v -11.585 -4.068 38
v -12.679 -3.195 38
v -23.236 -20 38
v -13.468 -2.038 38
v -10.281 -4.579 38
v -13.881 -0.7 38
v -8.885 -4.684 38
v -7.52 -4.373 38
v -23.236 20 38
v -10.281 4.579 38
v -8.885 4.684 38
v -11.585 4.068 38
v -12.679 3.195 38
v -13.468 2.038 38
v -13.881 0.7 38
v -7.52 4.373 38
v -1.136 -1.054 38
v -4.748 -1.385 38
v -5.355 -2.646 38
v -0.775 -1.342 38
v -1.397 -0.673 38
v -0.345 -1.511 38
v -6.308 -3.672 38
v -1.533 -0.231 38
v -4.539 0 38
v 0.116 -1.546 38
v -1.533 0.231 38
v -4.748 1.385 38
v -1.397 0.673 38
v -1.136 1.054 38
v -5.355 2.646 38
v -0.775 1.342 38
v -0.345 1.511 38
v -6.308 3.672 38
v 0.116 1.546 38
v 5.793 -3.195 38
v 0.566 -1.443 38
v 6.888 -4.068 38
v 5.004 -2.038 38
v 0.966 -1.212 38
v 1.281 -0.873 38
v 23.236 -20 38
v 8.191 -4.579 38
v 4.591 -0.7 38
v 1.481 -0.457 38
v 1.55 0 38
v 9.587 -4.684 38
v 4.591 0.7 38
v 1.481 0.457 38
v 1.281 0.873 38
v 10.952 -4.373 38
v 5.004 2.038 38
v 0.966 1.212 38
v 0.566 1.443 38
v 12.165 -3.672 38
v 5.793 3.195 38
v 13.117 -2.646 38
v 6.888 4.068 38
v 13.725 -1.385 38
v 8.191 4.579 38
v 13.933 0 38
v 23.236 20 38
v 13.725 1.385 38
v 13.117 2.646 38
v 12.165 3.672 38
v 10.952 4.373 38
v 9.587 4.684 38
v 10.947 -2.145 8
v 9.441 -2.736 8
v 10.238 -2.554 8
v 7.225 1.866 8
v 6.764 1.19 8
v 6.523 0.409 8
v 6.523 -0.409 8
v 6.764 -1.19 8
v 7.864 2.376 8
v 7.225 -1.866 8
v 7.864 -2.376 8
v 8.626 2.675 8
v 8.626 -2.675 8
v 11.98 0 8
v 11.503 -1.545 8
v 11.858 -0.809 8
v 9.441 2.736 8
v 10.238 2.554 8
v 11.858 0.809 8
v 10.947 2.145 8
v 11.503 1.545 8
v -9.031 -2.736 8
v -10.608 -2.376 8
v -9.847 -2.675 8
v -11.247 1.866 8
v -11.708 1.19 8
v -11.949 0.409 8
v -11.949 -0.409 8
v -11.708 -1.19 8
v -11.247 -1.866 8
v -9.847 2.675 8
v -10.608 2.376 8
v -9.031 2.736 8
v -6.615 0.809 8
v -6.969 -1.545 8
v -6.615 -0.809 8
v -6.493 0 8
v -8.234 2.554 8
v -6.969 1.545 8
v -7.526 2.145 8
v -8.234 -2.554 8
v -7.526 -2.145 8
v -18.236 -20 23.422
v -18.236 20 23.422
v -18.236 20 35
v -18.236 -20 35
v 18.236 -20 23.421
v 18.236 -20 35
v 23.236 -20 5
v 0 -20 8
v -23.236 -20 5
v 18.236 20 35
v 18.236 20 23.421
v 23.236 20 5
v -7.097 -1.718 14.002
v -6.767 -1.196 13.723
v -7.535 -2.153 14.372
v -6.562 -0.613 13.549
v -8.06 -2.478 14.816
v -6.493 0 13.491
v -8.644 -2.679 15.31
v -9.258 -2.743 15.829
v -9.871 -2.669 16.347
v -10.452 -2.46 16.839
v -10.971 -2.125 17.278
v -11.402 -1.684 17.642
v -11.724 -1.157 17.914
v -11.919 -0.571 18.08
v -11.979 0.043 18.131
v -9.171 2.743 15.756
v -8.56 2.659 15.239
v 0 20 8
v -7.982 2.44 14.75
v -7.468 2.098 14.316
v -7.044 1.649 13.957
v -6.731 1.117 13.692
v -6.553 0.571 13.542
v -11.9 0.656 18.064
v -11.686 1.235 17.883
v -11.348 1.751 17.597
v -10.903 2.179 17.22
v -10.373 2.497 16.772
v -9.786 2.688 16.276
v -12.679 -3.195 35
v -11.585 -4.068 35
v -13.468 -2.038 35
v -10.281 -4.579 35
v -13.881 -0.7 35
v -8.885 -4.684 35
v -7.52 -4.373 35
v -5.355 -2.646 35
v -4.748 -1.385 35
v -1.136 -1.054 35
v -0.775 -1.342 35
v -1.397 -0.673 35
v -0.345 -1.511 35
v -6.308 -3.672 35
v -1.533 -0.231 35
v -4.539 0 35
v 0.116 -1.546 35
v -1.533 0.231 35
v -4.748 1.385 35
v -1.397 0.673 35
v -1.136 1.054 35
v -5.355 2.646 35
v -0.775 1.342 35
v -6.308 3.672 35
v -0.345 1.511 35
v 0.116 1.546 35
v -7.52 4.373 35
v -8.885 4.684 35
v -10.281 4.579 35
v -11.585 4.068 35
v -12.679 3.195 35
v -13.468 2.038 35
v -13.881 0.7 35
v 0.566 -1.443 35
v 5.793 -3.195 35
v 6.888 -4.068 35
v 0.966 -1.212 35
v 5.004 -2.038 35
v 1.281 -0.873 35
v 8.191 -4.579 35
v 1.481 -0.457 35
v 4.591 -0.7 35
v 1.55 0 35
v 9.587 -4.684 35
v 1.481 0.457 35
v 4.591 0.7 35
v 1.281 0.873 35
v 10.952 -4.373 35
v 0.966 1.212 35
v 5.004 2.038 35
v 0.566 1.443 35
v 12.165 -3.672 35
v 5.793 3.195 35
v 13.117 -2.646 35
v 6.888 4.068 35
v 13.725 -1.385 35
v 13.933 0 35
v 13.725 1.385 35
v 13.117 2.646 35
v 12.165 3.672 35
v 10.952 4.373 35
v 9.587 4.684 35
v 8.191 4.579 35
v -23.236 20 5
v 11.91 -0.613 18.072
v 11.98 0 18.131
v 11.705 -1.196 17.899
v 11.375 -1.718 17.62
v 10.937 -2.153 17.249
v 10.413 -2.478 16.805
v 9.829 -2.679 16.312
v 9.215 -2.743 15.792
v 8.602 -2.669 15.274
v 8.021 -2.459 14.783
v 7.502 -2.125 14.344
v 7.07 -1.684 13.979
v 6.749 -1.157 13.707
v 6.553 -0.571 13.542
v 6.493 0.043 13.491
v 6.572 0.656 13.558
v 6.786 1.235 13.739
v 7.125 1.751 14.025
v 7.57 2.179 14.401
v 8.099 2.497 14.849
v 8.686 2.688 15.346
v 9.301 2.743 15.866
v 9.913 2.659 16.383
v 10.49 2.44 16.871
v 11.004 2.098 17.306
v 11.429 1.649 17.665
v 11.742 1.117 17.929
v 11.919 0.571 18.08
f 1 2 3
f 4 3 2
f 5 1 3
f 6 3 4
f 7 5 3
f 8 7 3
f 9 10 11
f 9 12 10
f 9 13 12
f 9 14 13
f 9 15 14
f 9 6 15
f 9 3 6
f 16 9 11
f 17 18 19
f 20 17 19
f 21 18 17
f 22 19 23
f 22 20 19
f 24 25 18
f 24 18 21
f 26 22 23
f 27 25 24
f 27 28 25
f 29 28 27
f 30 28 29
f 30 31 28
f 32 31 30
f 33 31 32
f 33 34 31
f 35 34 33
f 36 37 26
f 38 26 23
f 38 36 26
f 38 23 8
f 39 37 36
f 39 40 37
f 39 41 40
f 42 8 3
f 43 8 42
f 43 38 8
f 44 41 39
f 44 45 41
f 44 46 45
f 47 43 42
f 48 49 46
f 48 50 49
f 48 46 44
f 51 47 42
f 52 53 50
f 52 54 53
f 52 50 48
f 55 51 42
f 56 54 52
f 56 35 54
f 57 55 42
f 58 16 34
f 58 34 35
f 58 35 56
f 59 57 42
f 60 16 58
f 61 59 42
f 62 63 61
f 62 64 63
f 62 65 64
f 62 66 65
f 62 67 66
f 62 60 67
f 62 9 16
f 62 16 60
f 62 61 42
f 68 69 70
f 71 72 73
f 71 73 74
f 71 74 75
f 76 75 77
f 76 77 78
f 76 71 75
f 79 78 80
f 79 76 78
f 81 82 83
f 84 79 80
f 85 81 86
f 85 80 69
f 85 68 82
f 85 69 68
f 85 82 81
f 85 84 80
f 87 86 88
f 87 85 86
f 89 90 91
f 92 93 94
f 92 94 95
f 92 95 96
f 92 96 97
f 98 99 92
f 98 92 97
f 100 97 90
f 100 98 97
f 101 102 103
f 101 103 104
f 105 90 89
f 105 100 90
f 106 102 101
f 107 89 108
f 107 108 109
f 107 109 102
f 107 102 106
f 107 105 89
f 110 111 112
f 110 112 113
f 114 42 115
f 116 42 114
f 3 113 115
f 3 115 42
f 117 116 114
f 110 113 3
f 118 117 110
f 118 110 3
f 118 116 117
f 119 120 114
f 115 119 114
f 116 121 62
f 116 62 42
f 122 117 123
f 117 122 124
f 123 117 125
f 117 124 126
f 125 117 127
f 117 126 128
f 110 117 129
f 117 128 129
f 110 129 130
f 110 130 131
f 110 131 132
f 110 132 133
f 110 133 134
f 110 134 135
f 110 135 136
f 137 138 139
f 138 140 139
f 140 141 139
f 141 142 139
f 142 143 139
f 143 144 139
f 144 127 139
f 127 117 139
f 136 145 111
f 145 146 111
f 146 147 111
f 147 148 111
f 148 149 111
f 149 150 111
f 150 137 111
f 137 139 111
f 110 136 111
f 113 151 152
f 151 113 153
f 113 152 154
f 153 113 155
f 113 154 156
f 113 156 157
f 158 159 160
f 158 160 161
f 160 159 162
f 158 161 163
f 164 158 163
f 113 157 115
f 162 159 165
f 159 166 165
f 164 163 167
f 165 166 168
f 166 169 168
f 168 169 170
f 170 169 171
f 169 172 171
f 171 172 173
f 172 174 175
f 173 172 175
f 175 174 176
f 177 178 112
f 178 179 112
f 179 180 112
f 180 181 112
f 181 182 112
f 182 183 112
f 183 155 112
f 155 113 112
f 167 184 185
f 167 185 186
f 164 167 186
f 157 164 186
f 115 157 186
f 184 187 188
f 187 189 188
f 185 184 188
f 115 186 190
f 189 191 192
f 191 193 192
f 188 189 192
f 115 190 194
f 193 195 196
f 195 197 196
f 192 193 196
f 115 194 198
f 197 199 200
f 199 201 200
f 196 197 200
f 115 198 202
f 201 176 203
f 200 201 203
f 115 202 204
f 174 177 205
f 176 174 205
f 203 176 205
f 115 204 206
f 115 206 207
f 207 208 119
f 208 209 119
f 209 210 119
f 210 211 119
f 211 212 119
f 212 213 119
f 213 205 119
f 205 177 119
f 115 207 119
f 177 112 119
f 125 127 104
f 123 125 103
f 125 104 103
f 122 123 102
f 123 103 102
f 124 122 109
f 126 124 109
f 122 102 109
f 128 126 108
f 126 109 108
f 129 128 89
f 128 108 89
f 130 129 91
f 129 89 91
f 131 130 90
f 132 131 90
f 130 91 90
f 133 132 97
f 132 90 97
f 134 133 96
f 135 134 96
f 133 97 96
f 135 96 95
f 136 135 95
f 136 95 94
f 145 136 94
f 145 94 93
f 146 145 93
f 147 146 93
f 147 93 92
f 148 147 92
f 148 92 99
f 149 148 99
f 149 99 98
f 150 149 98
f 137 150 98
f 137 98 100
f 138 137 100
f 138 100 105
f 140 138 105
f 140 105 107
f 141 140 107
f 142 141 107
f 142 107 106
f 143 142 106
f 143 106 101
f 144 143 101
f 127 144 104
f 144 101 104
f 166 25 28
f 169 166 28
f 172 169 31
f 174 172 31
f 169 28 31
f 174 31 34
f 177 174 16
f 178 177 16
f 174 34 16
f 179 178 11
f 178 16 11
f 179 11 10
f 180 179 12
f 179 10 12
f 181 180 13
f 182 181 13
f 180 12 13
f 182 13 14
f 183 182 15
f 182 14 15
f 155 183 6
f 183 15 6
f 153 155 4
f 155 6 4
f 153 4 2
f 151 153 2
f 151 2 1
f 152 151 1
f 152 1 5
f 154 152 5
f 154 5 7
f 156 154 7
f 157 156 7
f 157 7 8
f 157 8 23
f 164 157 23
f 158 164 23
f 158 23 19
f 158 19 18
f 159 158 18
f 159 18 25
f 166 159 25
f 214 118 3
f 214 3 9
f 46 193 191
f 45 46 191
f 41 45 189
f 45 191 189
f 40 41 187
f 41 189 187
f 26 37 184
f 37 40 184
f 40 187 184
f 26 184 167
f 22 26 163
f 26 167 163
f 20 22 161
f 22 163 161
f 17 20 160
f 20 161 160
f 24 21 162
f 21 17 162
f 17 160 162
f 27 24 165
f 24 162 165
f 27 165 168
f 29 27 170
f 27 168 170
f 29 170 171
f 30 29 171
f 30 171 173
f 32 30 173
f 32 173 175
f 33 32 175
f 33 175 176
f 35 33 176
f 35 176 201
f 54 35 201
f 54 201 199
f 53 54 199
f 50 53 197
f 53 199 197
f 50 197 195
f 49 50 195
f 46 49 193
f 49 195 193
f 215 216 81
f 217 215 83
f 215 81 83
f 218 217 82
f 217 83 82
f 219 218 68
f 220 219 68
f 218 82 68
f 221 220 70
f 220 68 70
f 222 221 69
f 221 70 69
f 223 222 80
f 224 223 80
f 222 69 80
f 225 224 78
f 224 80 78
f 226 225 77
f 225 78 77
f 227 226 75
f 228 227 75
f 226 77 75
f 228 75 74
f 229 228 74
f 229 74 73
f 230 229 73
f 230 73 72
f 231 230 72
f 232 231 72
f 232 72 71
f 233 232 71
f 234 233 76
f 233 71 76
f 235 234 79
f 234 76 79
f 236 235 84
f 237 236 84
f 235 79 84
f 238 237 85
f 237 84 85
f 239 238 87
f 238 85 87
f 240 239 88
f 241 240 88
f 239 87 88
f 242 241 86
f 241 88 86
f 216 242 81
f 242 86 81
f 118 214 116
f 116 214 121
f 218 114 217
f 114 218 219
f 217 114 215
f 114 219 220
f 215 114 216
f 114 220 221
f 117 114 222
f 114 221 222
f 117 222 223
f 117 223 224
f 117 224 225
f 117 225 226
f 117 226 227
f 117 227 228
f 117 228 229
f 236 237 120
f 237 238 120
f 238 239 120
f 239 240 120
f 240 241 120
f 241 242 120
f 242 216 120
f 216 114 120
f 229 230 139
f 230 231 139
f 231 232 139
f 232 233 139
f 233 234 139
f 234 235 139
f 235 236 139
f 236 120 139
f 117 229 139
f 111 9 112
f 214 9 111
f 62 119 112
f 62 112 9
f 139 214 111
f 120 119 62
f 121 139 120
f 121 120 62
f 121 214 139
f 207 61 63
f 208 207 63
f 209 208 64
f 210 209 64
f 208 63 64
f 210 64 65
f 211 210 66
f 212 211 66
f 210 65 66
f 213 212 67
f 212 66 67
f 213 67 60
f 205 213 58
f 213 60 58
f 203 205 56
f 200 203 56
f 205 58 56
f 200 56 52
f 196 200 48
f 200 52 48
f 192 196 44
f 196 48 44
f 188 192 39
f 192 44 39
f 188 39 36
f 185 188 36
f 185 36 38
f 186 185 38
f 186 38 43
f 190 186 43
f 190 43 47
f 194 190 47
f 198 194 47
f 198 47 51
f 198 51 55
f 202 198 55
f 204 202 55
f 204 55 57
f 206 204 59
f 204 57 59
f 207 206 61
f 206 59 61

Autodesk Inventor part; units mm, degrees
ref_plane "YZ Plane" through (0, 0, 0) normal (1, 0, 0) x (0, 1, 0)
ref_plane "XZ Plane" through (0, 0, 0) normal (0, 1, 0) x (-1, 0, 0)
ref_plane "XY Plane" through (0, 0, 0) normal (0, 0, 1) x (1, 0, 0)
ref_plane "РабПлоскость2" through (0, 0, 5) normal (0, 0, 1) x (1, 0, 0)
sketch "Эскиз1" plane through (0, 0, 5) normal (0, 0, 1) x (1, 0, 0)
  line L0 (-14.2362, -16) -> (14.1136, -16) projected
  arc A0 (14.1136, -15.5263) -> (14.1136, -16) centre (14.9819, -15.7632) ccw projected
  line L1 (-14.2362, 16) -> (-14.2362, -16) projected
  line L2 (-18.2362, 20) -> (18.2362, 20)
  line L3 (18.2362, 20) -> (18.2362, -20)
  line L4 (18.2362, -20) -> (-18.2362, -20)
  line L5 (-18.2362, -20) -> (-18.2362, 20)
  circle A1 centre (9.2362, 0) radius 1.6
  circle A2 centre (-9.2362, 0) radius 1.6
  circle A3 centre (0.7638, 0) radius 2.15 projected
  circle A4 centre (19.2362, 0) radius 2.15 projected
  line L6 (14.1136, -15.5263) -> (14.1136, -16) projected
  line L7 (14.1136, -16) -> (23.5645, -16) projected
  line L8 (23.5645, -16) -> (23.5645, 16) projected
  line L9 (23.5645, 16) -> (-14.2362, 16) projected
  circle A5 centre (9.2362, -11) radius 3.25 projected
  circle A6 centre (9.2362, 11) radius 3.25 projected
  circle A7 centre (-9.2362, -11) radius 3.25 projected
  circle A8 centre (-9.2362, 11) radius 3.25 projected
  point P0 (14.2362, 16)
  dimension "d0" = 4
  dimension "d2" = 4
extrude "Выдавливание1" add sketch "Эскиз1" along normal blind 3 contours A0 L6 | L1 L9 L3 A4 L7 L0 | L0 L7 L3 L4 L5 L2 L9 L1 | A4 L3 | A1 | A2 | A3 | A5 | A6 | A7 | A8 picked at (17.8581, 0.0863)
sketch "Эскиз3" plane through (-18.2362, 20, 5) normal (0, 1, 0) x (1, 0, 0)
  line L0 (0, -3) -> (36.4725, -3) projected
  line L1 (36.4725, -3) -> (36.4725, -18.4215)
  line L2 (36.4725, -18.4215) -> (18.2361, -3)
  line L3 (18.2361, -3) -> (0, -18.4219)
  line L4 (0, -18.4219) -> (0, -3)
  point P0 (18.2362, 5)
  point P1 (18.2361, -3)
  point P2 (18.2361, -3)
extrude "Выдавливание2" add sketch "Эскиз3" against normal up to surface (40 mm away)
ref_plane "РабПлоскость4" through (0, 0, 8) normal (0, 0, 1) x (1, 0, 0)
sketch "Эскиз4" plane through (0, 0, 8) normal (0, 0, 1) x (1, 0, 0)
  circle A0 centre (9.2362, 0) radius 1.6 projected
  circle A1 centre (-9.2362, 0) radius 1.6 projected
  circle A2 centre (9.2362, 0) radius 2.7434
  circle A3 centre (-9.2362, 0) radius 2.7434
  point P0 (0, 0)
extrude "Выдавливание3" cut sketch "Эскиз4" along normal blind 14.75 contours A0 | A1 | A2 | A3
sketch "Эскиз5" plane through (0, 0, 5) normal (0, 0, -1) x (-1, 0, 0)
  line L0 (18.2362, 20) -> (18.2362, -20) projected
  line L1 (18.2362, 20) -> (23.2362, 20)
  line L2 (23.2362, 20) -> (23.2362, -20)
  line L3 (23.2362, -20) -> (18.2362, -20)
  line L4 (18.2362, -20) -> (18.2362, 20)
  line L5 (0.0002, -20) -> (-18.2362, -20) projected
  line L6 (-18.2362, -20) -> (-23.2362, -20)
  line L7 (-23.2362, -20) -> (-23.2362, 20)
  line L8 (-23.2362, 20) -> (-18.2362, 20)
  line L9 (-18.2362, 20) -> (-18.2362, -20)
  point P0 (0, 0)
  dimension "d11" = 5
  dimension "d12" = 5
extrude "Выдавливание4" add sketch "Эскиз5" against normal blind 30
sketch "Эскиз6" plane through (0, 0, 35) normal (0, 0, 1) x (1, 0, 0)
  line L0 (-23.2362, 20) -> (23.2362, 20)
  line L1 (23.2362, 20) -> (23.2362, -20)
  line L2 (23.2362, -20) -> (-23.2362, -20)
  line L3 (-23.2362, -20) -> (-23.2362, 20)
  circle A0 centre (0, 0) radius 1.55
  line L4 (23.2362, -20) -> (23.2362, 20) projected
  line L5 (23.2362, 20) -> (18.2362, 20) projected
  line L6 (-23.2362, 20) -> (-23.2362, -20) projected
  line L7 (-0.0002, -20) -> (18.2362, -20) projected
  dimension "d15" = 3.1
extrude "Выдавливание5" add sketch "Эскиз6" along normal blind 3
sketch "Эскиз7" plane through (0, 0, 38) normal (0, 0, 1) x (1, 0, 0)
  circle A0 centre (-9.2362, 0) radius 2.7434 projected
  line L0 (-18.2362, -20) -> (-0.0002, -20) projected
  line L1 (-0.0002, 20) -> (-0.0002, -20) projected
  line L2 (-18.2362, 20) -> (-0.0002, 20) projected
  line L3 (-18.2362, 20) -> (-18.2362, -20) projected
  circle A1 centre (9.2362, 0) radius 2.7434 projected
  line L4 (-0.0002, -20) -> (18.2362, -20) projected
  line L5 (18.2362, 20) -> (18.2362, -20) projected
  line L6 (-0.0002, 20) -> (18.2362, 20) projected
  line L7 (-0.0002, 20) -> (-0.0002, -20) projected
  circle A2 centre (-9.2362, 0) radius 4.6972
  circle A3 centre (9.2362, 0) radius 4.6972
  point P0 (0, 0)
extrude "Выдавливание6" cut sketch "Эскиз7" against normal up to surface (3 mm away) contours A0 | A1 | A2 | A3
properties part number "верх крепления маркера"
